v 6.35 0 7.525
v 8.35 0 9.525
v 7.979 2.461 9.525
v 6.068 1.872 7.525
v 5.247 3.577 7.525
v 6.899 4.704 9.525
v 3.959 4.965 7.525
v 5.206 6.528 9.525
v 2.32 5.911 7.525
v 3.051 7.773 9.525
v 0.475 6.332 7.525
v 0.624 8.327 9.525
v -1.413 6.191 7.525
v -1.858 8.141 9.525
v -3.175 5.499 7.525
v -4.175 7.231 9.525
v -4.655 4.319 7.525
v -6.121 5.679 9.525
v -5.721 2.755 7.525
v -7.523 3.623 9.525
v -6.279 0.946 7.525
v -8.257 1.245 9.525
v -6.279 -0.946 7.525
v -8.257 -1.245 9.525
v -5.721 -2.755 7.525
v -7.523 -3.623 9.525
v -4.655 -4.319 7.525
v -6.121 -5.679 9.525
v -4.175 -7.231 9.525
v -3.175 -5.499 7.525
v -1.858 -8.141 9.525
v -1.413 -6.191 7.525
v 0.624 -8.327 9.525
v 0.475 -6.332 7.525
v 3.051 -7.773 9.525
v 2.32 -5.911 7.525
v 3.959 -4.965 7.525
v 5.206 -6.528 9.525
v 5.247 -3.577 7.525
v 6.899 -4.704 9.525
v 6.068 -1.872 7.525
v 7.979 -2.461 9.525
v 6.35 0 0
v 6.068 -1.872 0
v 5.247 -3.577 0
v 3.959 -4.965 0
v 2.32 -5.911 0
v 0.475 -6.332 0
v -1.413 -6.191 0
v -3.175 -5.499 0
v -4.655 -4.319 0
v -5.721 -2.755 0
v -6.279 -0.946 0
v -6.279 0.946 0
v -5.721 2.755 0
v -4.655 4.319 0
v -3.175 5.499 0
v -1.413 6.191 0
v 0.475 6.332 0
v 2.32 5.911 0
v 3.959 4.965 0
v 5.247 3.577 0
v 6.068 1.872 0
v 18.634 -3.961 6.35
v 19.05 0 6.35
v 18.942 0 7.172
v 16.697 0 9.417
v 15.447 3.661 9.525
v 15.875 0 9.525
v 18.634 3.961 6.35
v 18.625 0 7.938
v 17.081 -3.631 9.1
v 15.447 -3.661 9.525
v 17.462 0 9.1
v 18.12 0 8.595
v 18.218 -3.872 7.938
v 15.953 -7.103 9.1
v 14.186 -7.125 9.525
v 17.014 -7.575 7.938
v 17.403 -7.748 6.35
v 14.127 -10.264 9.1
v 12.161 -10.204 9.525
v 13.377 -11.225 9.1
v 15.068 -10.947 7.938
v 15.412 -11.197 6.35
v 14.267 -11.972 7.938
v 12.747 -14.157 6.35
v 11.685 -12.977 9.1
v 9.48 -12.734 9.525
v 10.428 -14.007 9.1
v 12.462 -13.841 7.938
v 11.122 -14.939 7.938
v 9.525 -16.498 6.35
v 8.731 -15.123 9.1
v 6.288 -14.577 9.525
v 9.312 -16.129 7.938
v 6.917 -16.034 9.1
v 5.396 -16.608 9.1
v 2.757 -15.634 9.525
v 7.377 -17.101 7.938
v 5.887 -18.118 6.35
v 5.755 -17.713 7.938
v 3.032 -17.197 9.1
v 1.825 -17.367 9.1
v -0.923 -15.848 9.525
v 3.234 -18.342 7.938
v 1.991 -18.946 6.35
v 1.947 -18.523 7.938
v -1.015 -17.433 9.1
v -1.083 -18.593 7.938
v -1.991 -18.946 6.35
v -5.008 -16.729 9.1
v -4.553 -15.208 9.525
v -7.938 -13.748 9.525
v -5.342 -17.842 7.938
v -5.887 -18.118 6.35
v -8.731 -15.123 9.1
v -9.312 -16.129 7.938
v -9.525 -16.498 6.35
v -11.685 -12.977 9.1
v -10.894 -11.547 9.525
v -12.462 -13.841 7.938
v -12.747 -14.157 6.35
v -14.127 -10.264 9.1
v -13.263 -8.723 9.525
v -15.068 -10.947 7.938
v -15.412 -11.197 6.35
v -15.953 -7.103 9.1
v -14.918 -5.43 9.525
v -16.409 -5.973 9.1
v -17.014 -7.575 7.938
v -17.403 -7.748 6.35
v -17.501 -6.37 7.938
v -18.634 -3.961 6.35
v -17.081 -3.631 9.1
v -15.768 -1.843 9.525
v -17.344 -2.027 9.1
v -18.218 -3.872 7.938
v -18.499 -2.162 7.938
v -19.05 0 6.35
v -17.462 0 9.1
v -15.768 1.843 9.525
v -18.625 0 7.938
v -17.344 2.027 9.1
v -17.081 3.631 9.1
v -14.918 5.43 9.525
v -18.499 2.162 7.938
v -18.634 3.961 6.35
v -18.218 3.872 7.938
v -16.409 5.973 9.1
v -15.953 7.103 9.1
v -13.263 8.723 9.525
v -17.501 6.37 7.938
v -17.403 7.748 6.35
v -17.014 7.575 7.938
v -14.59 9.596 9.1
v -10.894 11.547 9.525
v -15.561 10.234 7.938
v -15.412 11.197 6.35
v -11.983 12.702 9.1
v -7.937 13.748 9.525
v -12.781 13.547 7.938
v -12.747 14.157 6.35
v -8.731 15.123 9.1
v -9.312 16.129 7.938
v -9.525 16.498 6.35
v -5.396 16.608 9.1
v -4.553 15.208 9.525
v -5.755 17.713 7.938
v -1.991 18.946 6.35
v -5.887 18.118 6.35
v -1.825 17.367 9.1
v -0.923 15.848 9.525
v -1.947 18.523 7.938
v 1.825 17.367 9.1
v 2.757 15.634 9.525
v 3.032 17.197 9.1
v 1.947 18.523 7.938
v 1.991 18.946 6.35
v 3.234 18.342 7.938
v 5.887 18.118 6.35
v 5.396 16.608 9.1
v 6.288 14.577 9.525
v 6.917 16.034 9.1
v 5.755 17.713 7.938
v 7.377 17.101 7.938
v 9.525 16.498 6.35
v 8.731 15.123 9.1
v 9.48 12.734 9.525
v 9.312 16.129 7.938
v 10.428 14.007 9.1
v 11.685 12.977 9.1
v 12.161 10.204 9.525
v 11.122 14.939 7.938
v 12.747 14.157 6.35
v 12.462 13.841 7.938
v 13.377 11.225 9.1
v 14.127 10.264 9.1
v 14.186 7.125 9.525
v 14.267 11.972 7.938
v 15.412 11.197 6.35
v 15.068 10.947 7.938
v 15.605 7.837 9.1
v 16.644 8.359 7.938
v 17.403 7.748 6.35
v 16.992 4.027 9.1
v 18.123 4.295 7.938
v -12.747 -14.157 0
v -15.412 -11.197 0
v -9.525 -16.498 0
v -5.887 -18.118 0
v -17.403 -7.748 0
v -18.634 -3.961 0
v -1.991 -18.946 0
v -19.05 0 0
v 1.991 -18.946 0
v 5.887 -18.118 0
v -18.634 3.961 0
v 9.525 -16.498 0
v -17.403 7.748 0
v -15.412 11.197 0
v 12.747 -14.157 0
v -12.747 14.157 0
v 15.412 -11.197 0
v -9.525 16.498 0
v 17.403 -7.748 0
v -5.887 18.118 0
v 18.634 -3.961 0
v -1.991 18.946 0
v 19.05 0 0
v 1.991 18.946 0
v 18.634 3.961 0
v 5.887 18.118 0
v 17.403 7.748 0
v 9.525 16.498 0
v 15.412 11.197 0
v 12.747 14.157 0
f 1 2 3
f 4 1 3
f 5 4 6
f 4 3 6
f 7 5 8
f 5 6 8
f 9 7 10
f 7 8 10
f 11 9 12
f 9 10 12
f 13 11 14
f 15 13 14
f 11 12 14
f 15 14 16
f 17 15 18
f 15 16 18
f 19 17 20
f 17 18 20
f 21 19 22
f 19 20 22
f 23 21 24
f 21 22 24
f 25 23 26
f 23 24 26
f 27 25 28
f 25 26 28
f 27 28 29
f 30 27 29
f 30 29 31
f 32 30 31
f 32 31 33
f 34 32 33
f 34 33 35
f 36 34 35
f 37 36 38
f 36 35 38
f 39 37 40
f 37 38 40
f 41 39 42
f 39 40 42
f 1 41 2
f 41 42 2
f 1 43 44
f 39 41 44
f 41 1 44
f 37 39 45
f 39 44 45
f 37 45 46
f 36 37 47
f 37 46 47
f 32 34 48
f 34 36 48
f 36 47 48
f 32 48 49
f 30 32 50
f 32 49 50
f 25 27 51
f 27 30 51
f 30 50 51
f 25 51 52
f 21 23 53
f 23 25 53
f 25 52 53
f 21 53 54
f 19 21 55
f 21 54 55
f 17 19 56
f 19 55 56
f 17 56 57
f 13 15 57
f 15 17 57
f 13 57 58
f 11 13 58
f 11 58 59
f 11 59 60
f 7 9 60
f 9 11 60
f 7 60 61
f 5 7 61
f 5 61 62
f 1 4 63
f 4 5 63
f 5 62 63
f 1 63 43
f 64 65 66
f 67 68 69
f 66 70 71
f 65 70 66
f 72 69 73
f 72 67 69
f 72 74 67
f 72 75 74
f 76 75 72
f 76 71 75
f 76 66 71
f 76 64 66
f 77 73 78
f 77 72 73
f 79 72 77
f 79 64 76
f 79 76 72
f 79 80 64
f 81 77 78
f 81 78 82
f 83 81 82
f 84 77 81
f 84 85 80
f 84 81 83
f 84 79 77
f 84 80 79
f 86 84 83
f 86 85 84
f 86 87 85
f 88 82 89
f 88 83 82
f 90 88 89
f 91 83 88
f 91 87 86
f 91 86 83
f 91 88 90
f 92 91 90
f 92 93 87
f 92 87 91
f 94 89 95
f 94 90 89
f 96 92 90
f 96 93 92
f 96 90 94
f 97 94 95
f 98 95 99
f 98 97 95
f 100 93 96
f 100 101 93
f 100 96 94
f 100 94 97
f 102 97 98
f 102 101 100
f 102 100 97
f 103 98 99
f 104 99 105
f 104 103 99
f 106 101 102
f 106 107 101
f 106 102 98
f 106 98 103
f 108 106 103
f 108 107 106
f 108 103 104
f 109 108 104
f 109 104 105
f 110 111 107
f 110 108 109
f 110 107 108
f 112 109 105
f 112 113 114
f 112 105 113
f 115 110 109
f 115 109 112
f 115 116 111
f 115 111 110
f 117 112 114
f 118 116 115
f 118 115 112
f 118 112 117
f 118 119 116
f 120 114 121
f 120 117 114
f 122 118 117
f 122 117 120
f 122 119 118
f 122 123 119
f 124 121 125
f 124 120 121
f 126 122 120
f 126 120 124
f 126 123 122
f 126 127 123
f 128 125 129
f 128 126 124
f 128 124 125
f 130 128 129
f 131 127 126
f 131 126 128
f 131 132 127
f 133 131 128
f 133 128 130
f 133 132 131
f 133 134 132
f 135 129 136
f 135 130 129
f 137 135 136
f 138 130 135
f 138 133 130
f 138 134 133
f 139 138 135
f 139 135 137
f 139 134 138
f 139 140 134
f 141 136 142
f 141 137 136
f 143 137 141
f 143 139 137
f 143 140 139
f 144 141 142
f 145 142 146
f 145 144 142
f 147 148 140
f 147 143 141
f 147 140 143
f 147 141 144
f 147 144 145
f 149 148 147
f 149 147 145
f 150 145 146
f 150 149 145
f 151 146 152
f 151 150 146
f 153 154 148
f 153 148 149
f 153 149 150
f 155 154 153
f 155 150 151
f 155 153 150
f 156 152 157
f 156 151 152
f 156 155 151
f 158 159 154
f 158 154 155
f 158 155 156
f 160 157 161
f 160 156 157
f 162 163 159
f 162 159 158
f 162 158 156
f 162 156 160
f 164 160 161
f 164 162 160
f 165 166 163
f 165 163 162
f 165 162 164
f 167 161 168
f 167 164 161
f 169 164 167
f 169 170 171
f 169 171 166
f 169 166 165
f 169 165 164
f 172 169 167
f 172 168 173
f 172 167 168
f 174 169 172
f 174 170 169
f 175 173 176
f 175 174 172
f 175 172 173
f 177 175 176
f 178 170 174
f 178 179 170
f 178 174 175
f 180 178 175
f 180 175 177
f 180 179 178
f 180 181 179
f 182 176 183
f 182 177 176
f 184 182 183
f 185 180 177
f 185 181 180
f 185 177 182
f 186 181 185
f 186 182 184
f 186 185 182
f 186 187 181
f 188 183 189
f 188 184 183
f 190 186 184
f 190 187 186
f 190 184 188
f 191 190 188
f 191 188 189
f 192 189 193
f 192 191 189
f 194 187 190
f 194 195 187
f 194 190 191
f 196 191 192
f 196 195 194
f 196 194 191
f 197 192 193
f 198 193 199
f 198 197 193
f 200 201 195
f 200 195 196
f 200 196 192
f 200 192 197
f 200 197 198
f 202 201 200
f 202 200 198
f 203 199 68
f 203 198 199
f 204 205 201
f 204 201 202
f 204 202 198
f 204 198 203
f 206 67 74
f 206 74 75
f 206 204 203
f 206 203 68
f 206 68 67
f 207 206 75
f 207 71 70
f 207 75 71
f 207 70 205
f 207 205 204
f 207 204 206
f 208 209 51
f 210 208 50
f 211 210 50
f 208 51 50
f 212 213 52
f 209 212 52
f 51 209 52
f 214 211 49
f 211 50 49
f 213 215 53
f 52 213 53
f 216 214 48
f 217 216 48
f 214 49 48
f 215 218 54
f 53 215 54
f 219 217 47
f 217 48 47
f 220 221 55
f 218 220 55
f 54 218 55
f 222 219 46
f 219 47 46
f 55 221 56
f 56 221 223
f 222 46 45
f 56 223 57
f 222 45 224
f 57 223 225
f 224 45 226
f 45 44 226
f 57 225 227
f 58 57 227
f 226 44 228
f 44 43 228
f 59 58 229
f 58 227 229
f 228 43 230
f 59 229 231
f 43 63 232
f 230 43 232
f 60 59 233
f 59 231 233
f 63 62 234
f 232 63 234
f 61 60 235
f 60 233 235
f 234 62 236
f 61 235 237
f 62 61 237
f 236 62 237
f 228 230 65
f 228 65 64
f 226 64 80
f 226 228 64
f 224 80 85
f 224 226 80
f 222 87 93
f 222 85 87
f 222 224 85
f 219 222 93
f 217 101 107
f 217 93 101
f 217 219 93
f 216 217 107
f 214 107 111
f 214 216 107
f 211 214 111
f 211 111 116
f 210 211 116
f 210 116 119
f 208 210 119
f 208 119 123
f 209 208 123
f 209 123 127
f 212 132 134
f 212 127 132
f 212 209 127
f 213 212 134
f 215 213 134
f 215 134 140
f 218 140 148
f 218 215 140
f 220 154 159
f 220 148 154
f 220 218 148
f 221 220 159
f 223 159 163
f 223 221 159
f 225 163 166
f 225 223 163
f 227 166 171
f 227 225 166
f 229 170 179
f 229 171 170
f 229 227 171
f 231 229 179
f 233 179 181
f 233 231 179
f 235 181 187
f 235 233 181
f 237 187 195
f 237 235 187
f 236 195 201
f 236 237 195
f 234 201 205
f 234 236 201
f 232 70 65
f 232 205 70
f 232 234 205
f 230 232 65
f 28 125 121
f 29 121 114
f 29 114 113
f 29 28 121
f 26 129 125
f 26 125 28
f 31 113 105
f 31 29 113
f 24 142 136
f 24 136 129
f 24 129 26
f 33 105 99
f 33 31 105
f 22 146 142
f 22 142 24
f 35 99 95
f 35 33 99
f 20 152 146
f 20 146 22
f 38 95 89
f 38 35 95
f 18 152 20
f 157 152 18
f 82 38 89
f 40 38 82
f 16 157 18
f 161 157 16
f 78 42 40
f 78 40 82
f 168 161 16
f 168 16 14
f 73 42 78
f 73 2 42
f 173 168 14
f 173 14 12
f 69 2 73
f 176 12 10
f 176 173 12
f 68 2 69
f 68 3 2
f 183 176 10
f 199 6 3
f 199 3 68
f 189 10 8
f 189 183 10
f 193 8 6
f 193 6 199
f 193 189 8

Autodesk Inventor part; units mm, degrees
ref_plane "YZ Plane" through (0, 0, 0) normal (1, 0, 0) x (0, 1, 0)
ref_plane "XZ Plane" through (0, 0, 0) normal (0, 1, 0) x (-1, 0, 0)
ref_plane "XY Plane" through (0, 0, 0) normal (0, 0, 1) x (1, 0, 0)
sketch "Sketch1" plane through (0, 0, 0) normal (0, 0, 1) x (1, 0, 0)
  circle A0 centre (0, 0) radius 19.05
  circle A1 centre (0, 0) radius 6.35
  point P0 (0, -19.05)
  point P1 (0, 19.05)
  dimension "d0" = 38.1
  dimension "d1" = 12.7
extrude "Extrusion1" add sketch "Sketch1" along normal blind 9.525
chamfer "Chamfer1" distance 2 angle 45 1 edges at (-6.35, 0, 9.525)
fillet "Fillet2" radius 3.175 1 edges at (-19.05, 0, 9.525)
properties part number "PIVOT_SPACERS,TREBUCHET" material "Wood (Oak)"
